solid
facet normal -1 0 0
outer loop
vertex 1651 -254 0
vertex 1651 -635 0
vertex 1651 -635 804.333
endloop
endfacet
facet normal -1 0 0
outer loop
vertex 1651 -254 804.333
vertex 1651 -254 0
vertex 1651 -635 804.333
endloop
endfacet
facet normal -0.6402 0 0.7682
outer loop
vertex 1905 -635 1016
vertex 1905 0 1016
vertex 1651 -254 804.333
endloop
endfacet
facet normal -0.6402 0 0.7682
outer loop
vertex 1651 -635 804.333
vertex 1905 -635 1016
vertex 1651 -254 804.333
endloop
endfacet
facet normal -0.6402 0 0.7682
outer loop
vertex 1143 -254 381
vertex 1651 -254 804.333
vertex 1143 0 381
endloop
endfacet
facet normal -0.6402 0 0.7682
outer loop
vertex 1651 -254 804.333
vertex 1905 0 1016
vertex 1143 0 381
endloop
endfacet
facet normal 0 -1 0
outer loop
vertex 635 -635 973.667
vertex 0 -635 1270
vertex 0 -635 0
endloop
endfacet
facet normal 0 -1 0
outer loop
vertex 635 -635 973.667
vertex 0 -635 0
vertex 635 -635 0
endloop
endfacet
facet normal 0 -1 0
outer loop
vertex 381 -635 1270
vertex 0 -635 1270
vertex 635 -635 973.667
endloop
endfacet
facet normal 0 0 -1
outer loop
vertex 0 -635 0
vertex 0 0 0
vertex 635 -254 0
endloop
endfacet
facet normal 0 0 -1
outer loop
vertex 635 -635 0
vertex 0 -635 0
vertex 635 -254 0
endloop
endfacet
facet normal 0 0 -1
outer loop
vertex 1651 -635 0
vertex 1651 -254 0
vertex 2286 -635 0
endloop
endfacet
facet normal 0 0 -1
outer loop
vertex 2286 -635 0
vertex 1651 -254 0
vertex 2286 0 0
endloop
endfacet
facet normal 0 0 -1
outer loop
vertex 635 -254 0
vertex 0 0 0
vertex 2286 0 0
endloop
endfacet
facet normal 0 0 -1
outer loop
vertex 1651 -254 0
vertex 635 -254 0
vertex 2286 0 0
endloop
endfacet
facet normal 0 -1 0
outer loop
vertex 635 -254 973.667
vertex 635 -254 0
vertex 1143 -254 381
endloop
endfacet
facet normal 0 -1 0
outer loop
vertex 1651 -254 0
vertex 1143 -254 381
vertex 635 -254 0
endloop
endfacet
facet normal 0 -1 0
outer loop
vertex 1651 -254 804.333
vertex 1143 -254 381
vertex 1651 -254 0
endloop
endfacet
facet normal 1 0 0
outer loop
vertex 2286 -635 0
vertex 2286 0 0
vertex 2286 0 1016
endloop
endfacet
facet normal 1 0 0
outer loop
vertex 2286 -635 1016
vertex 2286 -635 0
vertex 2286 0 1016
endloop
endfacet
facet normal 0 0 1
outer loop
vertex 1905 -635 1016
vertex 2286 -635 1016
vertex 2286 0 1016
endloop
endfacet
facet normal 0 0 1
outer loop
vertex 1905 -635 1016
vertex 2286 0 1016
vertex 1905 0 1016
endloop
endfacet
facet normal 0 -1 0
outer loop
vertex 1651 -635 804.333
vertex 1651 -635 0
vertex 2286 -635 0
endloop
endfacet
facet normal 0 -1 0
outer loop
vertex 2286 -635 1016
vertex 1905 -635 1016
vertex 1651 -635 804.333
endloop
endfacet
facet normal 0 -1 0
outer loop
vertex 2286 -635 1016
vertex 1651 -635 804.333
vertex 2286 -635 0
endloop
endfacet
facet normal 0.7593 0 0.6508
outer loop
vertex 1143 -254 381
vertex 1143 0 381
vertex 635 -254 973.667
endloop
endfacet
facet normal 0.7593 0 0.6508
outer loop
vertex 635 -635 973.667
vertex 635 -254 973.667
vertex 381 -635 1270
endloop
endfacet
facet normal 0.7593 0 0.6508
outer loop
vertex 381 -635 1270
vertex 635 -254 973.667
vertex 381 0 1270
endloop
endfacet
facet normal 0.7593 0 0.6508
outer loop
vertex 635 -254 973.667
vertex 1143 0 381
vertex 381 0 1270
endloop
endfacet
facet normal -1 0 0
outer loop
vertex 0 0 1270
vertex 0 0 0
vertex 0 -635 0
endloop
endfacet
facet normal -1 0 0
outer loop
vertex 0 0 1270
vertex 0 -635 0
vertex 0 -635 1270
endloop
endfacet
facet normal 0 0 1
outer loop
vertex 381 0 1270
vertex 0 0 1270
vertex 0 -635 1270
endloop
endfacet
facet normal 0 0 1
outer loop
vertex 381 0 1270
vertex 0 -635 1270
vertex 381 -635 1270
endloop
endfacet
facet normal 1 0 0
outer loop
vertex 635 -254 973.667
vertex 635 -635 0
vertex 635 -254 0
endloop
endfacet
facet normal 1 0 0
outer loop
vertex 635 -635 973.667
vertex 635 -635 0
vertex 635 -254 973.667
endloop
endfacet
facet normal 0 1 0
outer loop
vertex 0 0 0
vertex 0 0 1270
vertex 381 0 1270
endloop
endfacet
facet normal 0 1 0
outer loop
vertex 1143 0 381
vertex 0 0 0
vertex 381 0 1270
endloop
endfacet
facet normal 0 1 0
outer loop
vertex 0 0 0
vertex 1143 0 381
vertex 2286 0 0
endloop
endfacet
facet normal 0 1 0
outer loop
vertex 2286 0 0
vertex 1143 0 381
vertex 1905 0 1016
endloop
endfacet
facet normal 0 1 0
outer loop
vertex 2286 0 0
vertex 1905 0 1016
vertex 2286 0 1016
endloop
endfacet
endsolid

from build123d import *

# Parameters (mm, degrees)
F0_W     = 2286
F0_H     = 1270
F1_DEPTH = 635
F2_W     = 1016
F2_H     = 1270
F3_DEPTH = 381
F5_DEPTH = 635


with BuildPart() as f1:
    # F0 (on Front) → F1 (new body)
    with BuildSketch(Plane.XZ):
        with Locations((1143, 635)):
            Rectangle(F0_W, F0_H)
    extrude(amount=F1_DEPTH)

    # F2 (on face) → F3 (cut)
    with BuildSketch(Plane.XZ.offset(635)):
        with Locations((1143, 635)):
            Rectangle(F2_W, F2_H)
    extrude(amount=-F3_DEPTH, mode=Mode.SUBTRACT)

    # F4 (on face) → F5 (cut)
    with BuildSketch(Plane(origin=(0, 0, 0), x_dir=(-1, 0, 0), z_dir=(0, 1, 0))):
        Polygon((-1143, 381), (-381, 1270), (-2286, 1270), (-2286, 1016), (-1905, 1016), align=None)
    extrude(amount=-F5_DEPTH, mode=Mode.SUBTRACT)


solid = f1.part
